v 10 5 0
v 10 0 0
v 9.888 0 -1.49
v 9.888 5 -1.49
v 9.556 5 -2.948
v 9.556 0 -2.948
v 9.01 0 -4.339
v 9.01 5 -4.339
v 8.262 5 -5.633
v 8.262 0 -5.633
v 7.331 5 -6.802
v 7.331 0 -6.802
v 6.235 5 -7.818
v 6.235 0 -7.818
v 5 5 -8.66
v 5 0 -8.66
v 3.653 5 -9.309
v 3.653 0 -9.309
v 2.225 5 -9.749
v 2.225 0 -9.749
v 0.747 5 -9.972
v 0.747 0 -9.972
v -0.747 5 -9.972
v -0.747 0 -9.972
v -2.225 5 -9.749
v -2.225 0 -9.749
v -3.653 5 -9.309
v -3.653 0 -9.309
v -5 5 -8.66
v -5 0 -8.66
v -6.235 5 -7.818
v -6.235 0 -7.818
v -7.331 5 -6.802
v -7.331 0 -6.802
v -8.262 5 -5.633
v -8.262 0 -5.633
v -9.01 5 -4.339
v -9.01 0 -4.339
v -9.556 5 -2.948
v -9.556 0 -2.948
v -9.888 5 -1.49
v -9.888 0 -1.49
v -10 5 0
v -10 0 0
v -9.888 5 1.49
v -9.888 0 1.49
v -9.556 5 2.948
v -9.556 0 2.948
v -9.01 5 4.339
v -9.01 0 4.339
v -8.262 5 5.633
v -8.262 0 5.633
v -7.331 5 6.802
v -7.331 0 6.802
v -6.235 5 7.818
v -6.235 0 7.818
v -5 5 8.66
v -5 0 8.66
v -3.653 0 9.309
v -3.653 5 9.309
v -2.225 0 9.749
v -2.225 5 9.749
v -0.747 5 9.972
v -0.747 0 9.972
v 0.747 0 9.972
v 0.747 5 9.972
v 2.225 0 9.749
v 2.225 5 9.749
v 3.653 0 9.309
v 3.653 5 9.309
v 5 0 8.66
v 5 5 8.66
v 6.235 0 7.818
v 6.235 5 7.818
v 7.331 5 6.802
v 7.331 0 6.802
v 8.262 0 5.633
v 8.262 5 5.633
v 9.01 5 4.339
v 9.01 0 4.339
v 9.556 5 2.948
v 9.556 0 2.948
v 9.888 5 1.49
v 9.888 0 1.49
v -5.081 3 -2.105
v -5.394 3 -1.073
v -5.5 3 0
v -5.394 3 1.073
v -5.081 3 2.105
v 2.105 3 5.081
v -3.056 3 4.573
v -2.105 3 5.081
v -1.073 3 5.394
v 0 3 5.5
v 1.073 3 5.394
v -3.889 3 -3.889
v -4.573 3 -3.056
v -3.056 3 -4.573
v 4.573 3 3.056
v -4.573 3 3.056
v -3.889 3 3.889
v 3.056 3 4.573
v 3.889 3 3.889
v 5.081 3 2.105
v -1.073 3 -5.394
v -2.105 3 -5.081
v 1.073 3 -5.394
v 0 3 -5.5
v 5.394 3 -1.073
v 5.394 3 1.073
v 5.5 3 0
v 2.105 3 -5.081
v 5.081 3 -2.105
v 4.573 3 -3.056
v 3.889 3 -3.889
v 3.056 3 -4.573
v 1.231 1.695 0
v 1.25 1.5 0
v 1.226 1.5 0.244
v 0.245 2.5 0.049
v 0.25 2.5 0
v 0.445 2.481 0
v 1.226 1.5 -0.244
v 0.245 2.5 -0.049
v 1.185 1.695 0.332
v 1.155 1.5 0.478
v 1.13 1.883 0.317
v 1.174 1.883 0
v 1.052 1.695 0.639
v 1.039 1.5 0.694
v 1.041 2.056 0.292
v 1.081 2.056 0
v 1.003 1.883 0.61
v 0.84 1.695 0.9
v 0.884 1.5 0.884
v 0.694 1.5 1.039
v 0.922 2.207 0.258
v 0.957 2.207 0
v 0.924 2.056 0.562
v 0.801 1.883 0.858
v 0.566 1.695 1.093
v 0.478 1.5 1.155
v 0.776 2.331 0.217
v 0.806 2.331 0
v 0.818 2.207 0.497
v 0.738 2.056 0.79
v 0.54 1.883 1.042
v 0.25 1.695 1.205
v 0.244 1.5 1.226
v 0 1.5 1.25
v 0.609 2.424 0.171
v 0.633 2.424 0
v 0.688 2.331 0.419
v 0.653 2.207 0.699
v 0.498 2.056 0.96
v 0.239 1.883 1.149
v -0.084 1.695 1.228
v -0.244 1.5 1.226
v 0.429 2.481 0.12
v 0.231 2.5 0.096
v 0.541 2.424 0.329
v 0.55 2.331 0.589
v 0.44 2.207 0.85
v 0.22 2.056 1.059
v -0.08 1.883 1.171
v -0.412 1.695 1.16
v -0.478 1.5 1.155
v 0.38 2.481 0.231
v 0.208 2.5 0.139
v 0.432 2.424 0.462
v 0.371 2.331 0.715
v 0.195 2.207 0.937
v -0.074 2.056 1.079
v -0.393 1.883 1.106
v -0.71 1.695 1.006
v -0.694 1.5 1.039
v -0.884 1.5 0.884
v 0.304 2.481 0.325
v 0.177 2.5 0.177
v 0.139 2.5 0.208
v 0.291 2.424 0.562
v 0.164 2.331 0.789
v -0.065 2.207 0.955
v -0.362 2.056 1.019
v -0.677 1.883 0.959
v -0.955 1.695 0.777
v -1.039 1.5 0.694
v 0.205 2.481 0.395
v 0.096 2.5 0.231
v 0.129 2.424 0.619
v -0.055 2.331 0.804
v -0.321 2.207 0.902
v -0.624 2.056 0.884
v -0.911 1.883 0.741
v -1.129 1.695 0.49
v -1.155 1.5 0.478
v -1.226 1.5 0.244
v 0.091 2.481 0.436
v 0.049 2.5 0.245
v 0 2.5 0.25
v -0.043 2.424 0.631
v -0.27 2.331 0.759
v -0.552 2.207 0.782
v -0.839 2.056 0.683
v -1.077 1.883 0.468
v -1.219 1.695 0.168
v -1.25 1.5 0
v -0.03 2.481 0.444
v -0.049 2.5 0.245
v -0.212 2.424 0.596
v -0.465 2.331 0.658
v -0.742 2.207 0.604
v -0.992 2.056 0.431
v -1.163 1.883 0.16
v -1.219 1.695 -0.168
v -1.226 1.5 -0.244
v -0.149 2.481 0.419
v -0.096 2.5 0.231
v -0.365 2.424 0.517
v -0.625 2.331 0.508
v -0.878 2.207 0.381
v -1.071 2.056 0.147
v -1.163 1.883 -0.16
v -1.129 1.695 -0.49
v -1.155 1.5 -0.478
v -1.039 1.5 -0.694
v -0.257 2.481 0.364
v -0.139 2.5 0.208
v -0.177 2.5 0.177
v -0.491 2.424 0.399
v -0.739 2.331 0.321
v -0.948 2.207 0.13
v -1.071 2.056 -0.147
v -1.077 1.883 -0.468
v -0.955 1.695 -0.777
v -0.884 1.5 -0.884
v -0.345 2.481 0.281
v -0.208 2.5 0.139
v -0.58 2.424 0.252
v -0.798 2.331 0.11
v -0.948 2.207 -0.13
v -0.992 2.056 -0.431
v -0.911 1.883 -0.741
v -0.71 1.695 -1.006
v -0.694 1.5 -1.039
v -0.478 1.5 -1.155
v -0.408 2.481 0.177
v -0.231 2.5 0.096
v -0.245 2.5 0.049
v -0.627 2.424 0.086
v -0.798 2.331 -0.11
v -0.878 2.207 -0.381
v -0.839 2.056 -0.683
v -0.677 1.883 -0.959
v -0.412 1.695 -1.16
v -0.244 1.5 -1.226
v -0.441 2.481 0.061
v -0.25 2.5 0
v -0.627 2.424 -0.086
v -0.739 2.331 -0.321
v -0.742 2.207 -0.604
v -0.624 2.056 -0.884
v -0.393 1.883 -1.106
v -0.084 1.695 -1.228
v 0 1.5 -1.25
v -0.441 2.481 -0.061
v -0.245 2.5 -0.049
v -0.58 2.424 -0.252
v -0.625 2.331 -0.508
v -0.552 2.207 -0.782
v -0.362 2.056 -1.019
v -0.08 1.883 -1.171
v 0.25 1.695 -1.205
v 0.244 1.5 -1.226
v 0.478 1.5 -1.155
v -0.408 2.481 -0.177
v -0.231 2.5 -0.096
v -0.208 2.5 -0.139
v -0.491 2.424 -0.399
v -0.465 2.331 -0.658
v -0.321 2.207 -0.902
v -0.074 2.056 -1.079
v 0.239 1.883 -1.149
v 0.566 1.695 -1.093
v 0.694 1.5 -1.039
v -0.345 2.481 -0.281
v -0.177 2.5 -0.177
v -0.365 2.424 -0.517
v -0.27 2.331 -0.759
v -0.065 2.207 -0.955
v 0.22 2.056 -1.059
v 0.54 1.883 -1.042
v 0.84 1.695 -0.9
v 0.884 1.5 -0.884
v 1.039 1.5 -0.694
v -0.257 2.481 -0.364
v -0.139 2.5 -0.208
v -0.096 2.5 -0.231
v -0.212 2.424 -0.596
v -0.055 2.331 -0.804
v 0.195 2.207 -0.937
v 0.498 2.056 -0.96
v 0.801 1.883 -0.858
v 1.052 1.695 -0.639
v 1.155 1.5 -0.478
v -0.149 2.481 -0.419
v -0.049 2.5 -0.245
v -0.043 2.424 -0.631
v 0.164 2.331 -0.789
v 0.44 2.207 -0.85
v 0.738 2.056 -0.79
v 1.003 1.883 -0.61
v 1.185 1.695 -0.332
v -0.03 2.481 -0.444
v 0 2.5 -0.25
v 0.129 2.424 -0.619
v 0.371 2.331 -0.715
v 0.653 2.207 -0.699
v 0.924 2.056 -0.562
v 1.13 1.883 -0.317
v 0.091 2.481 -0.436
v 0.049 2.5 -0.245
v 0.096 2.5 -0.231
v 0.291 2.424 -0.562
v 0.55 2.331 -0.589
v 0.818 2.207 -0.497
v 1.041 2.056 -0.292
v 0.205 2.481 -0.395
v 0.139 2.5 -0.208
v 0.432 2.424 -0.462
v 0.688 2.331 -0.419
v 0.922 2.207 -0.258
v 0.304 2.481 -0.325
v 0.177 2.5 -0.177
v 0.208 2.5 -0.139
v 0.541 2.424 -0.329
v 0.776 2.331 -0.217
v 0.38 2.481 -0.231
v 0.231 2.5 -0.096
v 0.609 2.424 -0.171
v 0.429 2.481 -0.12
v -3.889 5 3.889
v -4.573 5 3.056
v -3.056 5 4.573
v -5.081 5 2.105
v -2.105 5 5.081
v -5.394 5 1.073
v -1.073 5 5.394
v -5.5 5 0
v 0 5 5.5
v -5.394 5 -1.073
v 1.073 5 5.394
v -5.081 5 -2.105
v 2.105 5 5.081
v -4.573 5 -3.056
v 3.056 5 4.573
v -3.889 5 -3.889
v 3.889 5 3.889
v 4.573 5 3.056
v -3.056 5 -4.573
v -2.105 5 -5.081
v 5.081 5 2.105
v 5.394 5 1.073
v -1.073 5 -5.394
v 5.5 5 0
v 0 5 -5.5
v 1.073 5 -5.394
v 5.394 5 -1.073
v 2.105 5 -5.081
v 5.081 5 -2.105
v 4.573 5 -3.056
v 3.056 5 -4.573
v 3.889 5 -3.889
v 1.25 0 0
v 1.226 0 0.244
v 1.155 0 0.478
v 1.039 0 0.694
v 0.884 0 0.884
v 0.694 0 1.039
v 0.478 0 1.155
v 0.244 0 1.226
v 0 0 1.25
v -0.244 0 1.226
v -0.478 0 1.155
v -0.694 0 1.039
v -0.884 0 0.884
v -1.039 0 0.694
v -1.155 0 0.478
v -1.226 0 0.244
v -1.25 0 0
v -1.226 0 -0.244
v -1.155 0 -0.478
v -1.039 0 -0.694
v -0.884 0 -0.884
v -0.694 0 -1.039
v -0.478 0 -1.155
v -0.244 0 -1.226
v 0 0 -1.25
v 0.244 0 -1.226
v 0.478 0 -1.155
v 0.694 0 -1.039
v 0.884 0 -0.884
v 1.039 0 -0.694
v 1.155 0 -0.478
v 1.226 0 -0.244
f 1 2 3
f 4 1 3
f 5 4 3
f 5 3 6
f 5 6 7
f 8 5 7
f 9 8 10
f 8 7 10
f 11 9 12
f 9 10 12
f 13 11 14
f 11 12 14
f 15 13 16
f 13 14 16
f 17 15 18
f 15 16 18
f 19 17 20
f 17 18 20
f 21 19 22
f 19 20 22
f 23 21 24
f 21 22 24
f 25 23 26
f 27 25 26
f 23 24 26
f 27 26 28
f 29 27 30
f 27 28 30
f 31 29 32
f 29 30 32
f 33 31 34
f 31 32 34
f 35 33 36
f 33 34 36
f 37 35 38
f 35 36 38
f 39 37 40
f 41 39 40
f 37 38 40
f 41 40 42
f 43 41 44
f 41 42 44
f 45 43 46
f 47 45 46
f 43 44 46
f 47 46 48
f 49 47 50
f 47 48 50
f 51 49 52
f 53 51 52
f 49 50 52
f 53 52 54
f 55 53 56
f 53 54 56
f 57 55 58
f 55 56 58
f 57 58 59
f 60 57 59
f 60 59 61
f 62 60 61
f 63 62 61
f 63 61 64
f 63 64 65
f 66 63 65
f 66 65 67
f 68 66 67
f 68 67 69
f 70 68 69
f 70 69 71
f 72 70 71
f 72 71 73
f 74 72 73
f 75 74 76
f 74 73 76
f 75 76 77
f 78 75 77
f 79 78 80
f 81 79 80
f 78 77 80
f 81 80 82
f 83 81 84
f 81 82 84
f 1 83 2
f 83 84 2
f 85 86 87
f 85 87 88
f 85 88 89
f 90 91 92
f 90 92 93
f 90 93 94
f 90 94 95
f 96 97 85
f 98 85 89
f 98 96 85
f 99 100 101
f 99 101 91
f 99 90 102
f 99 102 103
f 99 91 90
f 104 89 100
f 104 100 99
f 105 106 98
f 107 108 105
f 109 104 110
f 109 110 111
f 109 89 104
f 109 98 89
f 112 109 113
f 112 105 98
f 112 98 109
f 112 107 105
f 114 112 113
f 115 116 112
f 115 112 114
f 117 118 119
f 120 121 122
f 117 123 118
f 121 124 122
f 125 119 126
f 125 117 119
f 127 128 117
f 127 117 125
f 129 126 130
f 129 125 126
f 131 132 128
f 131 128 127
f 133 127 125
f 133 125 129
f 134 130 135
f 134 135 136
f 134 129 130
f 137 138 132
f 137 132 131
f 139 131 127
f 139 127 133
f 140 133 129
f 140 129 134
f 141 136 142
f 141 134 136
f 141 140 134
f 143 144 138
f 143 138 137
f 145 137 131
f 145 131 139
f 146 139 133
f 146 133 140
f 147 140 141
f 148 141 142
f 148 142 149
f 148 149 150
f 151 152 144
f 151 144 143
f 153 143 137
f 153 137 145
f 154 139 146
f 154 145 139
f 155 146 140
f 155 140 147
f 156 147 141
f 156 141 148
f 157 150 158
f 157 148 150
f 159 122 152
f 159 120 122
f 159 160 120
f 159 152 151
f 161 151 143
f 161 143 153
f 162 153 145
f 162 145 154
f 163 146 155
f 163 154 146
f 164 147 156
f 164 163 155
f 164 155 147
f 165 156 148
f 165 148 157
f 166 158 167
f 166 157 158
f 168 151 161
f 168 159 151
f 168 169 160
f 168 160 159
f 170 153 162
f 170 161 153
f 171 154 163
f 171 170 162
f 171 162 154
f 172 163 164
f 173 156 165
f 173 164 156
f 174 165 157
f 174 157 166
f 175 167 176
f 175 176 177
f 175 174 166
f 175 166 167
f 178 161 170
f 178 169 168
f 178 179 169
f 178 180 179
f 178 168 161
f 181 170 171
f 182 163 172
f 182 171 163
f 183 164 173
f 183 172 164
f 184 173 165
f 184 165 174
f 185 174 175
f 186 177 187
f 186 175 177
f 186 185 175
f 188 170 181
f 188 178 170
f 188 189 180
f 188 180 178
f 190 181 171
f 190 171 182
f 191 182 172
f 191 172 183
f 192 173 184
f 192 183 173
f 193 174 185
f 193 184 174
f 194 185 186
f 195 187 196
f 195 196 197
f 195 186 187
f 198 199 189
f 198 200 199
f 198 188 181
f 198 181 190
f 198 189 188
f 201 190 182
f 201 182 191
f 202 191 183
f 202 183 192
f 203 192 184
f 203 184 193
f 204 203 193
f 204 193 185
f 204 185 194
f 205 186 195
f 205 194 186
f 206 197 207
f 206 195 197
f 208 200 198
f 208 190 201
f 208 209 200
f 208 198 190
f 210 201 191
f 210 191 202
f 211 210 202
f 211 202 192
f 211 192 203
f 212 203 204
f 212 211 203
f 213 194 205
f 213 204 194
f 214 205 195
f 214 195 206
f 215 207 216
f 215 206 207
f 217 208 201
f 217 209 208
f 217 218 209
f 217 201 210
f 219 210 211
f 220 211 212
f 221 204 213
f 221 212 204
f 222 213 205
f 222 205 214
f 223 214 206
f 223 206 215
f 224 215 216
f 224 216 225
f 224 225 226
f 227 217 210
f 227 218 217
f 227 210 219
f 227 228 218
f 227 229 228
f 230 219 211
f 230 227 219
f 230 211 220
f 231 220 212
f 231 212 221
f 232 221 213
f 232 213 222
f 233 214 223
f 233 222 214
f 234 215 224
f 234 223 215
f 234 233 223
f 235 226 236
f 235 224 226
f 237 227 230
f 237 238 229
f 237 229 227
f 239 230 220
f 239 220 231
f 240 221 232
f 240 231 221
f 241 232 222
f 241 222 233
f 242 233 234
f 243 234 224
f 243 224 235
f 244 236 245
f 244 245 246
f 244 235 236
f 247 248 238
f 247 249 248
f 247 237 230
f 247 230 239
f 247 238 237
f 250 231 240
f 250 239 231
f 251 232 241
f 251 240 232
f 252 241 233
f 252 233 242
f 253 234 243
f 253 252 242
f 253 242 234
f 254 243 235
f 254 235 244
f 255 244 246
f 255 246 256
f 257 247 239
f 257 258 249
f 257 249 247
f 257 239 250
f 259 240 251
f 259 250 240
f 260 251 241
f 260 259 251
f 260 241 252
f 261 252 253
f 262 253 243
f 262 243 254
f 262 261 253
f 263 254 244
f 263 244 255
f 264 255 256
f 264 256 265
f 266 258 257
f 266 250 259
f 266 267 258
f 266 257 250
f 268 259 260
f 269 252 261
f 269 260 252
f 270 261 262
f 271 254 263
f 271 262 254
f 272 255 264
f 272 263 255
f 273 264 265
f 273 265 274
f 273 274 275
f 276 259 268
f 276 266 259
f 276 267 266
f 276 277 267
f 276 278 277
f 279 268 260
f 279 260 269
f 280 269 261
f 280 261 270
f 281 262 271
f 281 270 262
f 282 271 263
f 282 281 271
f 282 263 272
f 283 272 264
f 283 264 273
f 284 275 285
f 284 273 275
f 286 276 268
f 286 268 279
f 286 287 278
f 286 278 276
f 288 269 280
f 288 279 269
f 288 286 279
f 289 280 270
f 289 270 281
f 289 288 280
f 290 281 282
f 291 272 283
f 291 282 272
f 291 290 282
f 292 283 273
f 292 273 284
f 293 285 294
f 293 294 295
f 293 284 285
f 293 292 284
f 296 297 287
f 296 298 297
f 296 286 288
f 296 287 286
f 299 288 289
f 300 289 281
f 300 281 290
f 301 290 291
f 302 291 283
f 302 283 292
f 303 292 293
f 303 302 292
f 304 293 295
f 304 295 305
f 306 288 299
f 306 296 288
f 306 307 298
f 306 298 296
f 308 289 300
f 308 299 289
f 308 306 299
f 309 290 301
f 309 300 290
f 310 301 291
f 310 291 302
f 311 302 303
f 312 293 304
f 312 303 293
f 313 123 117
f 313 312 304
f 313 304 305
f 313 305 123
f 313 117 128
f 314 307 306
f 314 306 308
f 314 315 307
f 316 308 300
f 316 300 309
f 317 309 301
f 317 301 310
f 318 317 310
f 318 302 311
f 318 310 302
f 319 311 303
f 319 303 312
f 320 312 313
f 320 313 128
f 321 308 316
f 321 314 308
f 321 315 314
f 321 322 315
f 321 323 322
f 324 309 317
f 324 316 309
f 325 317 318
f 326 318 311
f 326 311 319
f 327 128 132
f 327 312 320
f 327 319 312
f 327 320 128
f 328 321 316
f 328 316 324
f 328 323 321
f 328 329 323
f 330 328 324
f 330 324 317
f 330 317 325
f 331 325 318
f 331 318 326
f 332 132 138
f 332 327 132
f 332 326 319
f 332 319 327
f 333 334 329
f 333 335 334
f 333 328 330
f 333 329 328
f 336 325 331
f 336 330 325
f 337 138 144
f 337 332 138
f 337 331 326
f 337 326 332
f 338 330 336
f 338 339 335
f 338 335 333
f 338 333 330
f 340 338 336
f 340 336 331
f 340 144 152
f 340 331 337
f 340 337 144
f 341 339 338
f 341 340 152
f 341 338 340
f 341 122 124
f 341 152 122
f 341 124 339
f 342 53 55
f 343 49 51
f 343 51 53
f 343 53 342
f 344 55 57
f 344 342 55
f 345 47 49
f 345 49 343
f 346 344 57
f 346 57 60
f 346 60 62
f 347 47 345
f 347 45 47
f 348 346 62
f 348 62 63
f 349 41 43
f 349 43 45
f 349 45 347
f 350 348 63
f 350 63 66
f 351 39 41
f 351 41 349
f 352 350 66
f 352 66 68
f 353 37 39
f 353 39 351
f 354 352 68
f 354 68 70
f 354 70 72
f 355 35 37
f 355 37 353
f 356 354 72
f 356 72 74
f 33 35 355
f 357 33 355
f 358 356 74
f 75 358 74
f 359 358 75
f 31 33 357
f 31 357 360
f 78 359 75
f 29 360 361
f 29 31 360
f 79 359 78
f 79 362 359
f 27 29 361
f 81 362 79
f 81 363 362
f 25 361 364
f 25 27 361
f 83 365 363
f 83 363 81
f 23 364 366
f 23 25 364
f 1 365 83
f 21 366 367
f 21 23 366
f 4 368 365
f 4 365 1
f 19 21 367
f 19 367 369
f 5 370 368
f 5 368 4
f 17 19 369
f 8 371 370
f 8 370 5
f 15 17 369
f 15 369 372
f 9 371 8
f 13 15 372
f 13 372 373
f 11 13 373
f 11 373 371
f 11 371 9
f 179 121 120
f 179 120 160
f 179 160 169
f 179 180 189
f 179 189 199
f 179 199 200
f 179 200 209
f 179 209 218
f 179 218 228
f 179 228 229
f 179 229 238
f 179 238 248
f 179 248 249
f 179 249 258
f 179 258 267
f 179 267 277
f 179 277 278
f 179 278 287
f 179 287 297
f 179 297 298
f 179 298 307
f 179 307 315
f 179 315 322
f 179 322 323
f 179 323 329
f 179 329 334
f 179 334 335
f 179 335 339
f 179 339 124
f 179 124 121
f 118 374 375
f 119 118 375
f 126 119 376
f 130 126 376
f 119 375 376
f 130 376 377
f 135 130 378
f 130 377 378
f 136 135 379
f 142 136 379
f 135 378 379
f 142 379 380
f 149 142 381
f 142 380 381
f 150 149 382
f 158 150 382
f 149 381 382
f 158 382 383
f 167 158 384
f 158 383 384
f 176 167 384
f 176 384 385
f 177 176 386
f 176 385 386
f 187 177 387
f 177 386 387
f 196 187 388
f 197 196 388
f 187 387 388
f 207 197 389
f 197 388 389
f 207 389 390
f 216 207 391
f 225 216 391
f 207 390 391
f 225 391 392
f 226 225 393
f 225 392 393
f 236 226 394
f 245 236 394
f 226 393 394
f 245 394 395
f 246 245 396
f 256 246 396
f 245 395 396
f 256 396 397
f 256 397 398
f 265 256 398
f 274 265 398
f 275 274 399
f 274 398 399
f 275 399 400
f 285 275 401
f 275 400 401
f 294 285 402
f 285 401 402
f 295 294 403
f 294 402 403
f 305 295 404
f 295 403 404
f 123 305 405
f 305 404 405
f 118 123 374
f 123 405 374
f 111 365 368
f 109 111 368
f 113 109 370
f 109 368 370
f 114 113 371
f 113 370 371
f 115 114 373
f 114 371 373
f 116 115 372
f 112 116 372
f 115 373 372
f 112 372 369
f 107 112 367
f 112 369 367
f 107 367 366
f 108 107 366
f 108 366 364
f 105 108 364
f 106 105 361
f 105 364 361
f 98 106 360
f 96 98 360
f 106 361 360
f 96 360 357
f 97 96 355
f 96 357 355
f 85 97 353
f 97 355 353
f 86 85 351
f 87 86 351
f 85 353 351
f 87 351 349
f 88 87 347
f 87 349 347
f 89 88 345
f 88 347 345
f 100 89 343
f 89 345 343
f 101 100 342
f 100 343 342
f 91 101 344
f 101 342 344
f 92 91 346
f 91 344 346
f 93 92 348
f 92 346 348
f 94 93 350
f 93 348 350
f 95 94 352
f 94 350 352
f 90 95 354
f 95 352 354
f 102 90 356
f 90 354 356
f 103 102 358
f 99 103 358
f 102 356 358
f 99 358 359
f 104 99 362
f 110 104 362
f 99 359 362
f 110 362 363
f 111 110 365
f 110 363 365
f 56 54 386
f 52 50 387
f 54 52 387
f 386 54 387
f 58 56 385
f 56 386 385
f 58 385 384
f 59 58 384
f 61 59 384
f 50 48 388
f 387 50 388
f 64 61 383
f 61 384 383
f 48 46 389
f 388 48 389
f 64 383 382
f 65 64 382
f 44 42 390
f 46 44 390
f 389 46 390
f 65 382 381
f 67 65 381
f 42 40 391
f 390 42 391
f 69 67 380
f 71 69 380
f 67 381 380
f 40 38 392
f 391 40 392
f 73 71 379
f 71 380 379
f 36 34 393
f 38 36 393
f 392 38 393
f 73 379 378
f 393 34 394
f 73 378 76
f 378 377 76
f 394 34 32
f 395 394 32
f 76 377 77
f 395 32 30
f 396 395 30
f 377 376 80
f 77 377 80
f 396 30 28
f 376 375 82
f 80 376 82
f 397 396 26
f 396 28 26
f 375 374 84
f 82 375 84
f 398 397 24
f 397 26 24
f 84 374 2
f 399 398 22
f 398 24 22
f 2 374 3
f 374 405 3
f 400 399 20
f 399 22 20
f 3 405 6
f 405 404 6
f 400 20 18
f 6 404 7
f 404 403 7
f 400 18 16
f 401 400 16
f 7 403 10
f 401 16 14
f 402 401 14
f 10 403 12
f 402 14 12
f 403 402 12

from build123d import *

# Parameters (mm, degrees)
SKETCH1_R           = 10
BOSS_EXTRUDE1_DEPTH = 5
SKETCH2_R           = 5.5
CUT_EXTRUDE1_DEPTH  = 2
SKETCH3_R           = 1.25
CUT_EXTRUDE2_DEPTH  = 2.5
FILLET1_R           = 1


with BuildPart() as part:
    # Sketch1 → Boss-Extrude1 (new body)
    with BuildSketch(Plane(origin=(0, 0, 0), x_dir=(1, 0, 0), z_dir=(0, 1, 0))):
        Circle(SKETCH1_R)
    extrude(amount=BOSS_EXTRUDE1_DEPTH)

    # Sketch2 → Cut-Extrude1 (cut)
    with BuildSketch(Plane(origin=(0, 5, 0), x_dir=(1, 0, 0), z_dir=(0, 1, 0))):
        Circle(SKETCH2_R)
    extrude(amount=-CUT_EXTRUDE1_DEPTH, mode=Mode.SUBTRACT)

    # Sketch3 → Cut-Extrude2 (cut)
    with BuildSketch(Plane.XZ):
        Circle(SKETCH3_R)
    extrude(amount=-CUT_EXTRUDE2_DEPTH, mode=Mode.SUBTRACT)

    # Fillet1
    fillet1_edges = [part.edges().sort_by_distance(p)[0] for p in [
        (-1.25, 2.5, 0),
    ]]
    fillet(fillet1_edges, radius=FILLET1_R)


solid = part.part
